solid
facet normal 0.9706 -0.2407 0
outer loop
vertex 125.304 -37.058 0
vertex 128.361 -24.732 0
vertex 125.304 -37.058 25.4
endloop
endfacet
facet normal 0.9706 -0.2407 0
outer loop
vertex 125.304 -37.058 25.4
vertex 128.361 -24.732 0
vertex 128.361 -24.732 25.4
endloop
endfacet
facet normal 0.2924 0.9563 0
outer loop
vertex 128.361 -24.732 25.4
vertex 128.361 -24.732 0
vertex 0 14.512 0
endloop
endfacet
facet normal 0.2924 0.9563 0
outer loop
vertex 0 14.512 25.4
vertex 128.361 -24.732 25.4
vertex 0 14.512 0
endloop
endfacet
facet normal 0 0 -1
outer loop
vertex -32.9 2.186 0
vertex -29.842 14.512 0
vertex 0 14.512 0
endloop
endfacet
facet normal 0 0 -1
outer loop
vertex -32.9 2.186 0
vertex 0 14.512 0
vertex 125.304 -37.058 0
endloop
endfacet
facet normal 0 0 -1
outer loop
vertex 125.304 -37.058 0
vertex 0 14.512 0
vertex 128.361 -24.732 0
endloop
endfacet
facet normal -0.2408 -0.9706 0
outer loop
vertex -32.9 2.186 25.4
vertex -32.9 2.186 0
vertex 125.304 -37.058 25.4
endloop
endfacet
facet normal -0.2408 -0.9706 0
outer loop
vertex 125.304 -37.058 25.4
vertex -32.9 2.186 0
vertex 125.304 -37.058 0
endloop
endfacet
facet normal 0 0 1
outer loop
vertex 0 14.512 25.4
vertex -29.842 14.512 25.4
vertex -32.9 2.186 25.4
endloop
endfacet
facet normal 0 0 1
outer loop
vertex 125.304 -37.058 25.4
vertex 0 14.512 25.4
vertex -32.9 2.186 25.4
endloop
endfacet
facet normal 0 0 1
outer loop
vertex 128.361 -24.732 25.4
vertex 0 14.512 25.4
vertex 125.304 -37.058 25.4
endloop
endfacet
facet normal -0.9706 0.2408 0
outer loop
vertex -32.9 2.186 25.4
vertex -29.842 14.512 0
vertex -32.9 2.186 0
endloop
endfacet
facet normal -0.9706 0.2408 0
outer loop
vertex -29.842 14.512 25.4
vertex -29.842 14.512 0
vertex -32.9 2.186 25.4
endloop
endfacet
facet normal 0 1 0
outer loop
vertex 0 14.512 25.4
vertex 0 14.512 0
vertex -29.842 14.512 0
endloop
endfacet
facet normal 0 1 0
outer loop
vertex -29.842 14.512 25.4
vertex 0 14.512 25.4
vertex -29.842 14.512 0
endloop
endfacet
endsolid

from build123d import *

# Parameters (mm, degrees)
F2_DEPTH = 25.4
F3_DEPTH = 12.7


# Not quite as in the source:
# - a length typed as a fraction of an inch, garbled in the dataset ("3 / 203.2 mm" for 3/8 in), is restored


with BuildPart() as f2:
    # F1 (on face) → F2 (new body)
    with BuildSketch(Plane.XY):
        Polygon((-29.84200418, 14.5122259855), (128.3614784479, -24.7320532799), (0, 14.5122259855), align=None)
    extrude(amount=F2_DEPTH)

    # F3 (add): a face of the model
    f3_faces = [f2.faces().sort_by_distance(p)[0] for p in [
        (49.259737134, -5.1099136472, 12.7),
    ]]
    extrude(f3_faces, amount=F3_DEPTH)


solid = f2.part
